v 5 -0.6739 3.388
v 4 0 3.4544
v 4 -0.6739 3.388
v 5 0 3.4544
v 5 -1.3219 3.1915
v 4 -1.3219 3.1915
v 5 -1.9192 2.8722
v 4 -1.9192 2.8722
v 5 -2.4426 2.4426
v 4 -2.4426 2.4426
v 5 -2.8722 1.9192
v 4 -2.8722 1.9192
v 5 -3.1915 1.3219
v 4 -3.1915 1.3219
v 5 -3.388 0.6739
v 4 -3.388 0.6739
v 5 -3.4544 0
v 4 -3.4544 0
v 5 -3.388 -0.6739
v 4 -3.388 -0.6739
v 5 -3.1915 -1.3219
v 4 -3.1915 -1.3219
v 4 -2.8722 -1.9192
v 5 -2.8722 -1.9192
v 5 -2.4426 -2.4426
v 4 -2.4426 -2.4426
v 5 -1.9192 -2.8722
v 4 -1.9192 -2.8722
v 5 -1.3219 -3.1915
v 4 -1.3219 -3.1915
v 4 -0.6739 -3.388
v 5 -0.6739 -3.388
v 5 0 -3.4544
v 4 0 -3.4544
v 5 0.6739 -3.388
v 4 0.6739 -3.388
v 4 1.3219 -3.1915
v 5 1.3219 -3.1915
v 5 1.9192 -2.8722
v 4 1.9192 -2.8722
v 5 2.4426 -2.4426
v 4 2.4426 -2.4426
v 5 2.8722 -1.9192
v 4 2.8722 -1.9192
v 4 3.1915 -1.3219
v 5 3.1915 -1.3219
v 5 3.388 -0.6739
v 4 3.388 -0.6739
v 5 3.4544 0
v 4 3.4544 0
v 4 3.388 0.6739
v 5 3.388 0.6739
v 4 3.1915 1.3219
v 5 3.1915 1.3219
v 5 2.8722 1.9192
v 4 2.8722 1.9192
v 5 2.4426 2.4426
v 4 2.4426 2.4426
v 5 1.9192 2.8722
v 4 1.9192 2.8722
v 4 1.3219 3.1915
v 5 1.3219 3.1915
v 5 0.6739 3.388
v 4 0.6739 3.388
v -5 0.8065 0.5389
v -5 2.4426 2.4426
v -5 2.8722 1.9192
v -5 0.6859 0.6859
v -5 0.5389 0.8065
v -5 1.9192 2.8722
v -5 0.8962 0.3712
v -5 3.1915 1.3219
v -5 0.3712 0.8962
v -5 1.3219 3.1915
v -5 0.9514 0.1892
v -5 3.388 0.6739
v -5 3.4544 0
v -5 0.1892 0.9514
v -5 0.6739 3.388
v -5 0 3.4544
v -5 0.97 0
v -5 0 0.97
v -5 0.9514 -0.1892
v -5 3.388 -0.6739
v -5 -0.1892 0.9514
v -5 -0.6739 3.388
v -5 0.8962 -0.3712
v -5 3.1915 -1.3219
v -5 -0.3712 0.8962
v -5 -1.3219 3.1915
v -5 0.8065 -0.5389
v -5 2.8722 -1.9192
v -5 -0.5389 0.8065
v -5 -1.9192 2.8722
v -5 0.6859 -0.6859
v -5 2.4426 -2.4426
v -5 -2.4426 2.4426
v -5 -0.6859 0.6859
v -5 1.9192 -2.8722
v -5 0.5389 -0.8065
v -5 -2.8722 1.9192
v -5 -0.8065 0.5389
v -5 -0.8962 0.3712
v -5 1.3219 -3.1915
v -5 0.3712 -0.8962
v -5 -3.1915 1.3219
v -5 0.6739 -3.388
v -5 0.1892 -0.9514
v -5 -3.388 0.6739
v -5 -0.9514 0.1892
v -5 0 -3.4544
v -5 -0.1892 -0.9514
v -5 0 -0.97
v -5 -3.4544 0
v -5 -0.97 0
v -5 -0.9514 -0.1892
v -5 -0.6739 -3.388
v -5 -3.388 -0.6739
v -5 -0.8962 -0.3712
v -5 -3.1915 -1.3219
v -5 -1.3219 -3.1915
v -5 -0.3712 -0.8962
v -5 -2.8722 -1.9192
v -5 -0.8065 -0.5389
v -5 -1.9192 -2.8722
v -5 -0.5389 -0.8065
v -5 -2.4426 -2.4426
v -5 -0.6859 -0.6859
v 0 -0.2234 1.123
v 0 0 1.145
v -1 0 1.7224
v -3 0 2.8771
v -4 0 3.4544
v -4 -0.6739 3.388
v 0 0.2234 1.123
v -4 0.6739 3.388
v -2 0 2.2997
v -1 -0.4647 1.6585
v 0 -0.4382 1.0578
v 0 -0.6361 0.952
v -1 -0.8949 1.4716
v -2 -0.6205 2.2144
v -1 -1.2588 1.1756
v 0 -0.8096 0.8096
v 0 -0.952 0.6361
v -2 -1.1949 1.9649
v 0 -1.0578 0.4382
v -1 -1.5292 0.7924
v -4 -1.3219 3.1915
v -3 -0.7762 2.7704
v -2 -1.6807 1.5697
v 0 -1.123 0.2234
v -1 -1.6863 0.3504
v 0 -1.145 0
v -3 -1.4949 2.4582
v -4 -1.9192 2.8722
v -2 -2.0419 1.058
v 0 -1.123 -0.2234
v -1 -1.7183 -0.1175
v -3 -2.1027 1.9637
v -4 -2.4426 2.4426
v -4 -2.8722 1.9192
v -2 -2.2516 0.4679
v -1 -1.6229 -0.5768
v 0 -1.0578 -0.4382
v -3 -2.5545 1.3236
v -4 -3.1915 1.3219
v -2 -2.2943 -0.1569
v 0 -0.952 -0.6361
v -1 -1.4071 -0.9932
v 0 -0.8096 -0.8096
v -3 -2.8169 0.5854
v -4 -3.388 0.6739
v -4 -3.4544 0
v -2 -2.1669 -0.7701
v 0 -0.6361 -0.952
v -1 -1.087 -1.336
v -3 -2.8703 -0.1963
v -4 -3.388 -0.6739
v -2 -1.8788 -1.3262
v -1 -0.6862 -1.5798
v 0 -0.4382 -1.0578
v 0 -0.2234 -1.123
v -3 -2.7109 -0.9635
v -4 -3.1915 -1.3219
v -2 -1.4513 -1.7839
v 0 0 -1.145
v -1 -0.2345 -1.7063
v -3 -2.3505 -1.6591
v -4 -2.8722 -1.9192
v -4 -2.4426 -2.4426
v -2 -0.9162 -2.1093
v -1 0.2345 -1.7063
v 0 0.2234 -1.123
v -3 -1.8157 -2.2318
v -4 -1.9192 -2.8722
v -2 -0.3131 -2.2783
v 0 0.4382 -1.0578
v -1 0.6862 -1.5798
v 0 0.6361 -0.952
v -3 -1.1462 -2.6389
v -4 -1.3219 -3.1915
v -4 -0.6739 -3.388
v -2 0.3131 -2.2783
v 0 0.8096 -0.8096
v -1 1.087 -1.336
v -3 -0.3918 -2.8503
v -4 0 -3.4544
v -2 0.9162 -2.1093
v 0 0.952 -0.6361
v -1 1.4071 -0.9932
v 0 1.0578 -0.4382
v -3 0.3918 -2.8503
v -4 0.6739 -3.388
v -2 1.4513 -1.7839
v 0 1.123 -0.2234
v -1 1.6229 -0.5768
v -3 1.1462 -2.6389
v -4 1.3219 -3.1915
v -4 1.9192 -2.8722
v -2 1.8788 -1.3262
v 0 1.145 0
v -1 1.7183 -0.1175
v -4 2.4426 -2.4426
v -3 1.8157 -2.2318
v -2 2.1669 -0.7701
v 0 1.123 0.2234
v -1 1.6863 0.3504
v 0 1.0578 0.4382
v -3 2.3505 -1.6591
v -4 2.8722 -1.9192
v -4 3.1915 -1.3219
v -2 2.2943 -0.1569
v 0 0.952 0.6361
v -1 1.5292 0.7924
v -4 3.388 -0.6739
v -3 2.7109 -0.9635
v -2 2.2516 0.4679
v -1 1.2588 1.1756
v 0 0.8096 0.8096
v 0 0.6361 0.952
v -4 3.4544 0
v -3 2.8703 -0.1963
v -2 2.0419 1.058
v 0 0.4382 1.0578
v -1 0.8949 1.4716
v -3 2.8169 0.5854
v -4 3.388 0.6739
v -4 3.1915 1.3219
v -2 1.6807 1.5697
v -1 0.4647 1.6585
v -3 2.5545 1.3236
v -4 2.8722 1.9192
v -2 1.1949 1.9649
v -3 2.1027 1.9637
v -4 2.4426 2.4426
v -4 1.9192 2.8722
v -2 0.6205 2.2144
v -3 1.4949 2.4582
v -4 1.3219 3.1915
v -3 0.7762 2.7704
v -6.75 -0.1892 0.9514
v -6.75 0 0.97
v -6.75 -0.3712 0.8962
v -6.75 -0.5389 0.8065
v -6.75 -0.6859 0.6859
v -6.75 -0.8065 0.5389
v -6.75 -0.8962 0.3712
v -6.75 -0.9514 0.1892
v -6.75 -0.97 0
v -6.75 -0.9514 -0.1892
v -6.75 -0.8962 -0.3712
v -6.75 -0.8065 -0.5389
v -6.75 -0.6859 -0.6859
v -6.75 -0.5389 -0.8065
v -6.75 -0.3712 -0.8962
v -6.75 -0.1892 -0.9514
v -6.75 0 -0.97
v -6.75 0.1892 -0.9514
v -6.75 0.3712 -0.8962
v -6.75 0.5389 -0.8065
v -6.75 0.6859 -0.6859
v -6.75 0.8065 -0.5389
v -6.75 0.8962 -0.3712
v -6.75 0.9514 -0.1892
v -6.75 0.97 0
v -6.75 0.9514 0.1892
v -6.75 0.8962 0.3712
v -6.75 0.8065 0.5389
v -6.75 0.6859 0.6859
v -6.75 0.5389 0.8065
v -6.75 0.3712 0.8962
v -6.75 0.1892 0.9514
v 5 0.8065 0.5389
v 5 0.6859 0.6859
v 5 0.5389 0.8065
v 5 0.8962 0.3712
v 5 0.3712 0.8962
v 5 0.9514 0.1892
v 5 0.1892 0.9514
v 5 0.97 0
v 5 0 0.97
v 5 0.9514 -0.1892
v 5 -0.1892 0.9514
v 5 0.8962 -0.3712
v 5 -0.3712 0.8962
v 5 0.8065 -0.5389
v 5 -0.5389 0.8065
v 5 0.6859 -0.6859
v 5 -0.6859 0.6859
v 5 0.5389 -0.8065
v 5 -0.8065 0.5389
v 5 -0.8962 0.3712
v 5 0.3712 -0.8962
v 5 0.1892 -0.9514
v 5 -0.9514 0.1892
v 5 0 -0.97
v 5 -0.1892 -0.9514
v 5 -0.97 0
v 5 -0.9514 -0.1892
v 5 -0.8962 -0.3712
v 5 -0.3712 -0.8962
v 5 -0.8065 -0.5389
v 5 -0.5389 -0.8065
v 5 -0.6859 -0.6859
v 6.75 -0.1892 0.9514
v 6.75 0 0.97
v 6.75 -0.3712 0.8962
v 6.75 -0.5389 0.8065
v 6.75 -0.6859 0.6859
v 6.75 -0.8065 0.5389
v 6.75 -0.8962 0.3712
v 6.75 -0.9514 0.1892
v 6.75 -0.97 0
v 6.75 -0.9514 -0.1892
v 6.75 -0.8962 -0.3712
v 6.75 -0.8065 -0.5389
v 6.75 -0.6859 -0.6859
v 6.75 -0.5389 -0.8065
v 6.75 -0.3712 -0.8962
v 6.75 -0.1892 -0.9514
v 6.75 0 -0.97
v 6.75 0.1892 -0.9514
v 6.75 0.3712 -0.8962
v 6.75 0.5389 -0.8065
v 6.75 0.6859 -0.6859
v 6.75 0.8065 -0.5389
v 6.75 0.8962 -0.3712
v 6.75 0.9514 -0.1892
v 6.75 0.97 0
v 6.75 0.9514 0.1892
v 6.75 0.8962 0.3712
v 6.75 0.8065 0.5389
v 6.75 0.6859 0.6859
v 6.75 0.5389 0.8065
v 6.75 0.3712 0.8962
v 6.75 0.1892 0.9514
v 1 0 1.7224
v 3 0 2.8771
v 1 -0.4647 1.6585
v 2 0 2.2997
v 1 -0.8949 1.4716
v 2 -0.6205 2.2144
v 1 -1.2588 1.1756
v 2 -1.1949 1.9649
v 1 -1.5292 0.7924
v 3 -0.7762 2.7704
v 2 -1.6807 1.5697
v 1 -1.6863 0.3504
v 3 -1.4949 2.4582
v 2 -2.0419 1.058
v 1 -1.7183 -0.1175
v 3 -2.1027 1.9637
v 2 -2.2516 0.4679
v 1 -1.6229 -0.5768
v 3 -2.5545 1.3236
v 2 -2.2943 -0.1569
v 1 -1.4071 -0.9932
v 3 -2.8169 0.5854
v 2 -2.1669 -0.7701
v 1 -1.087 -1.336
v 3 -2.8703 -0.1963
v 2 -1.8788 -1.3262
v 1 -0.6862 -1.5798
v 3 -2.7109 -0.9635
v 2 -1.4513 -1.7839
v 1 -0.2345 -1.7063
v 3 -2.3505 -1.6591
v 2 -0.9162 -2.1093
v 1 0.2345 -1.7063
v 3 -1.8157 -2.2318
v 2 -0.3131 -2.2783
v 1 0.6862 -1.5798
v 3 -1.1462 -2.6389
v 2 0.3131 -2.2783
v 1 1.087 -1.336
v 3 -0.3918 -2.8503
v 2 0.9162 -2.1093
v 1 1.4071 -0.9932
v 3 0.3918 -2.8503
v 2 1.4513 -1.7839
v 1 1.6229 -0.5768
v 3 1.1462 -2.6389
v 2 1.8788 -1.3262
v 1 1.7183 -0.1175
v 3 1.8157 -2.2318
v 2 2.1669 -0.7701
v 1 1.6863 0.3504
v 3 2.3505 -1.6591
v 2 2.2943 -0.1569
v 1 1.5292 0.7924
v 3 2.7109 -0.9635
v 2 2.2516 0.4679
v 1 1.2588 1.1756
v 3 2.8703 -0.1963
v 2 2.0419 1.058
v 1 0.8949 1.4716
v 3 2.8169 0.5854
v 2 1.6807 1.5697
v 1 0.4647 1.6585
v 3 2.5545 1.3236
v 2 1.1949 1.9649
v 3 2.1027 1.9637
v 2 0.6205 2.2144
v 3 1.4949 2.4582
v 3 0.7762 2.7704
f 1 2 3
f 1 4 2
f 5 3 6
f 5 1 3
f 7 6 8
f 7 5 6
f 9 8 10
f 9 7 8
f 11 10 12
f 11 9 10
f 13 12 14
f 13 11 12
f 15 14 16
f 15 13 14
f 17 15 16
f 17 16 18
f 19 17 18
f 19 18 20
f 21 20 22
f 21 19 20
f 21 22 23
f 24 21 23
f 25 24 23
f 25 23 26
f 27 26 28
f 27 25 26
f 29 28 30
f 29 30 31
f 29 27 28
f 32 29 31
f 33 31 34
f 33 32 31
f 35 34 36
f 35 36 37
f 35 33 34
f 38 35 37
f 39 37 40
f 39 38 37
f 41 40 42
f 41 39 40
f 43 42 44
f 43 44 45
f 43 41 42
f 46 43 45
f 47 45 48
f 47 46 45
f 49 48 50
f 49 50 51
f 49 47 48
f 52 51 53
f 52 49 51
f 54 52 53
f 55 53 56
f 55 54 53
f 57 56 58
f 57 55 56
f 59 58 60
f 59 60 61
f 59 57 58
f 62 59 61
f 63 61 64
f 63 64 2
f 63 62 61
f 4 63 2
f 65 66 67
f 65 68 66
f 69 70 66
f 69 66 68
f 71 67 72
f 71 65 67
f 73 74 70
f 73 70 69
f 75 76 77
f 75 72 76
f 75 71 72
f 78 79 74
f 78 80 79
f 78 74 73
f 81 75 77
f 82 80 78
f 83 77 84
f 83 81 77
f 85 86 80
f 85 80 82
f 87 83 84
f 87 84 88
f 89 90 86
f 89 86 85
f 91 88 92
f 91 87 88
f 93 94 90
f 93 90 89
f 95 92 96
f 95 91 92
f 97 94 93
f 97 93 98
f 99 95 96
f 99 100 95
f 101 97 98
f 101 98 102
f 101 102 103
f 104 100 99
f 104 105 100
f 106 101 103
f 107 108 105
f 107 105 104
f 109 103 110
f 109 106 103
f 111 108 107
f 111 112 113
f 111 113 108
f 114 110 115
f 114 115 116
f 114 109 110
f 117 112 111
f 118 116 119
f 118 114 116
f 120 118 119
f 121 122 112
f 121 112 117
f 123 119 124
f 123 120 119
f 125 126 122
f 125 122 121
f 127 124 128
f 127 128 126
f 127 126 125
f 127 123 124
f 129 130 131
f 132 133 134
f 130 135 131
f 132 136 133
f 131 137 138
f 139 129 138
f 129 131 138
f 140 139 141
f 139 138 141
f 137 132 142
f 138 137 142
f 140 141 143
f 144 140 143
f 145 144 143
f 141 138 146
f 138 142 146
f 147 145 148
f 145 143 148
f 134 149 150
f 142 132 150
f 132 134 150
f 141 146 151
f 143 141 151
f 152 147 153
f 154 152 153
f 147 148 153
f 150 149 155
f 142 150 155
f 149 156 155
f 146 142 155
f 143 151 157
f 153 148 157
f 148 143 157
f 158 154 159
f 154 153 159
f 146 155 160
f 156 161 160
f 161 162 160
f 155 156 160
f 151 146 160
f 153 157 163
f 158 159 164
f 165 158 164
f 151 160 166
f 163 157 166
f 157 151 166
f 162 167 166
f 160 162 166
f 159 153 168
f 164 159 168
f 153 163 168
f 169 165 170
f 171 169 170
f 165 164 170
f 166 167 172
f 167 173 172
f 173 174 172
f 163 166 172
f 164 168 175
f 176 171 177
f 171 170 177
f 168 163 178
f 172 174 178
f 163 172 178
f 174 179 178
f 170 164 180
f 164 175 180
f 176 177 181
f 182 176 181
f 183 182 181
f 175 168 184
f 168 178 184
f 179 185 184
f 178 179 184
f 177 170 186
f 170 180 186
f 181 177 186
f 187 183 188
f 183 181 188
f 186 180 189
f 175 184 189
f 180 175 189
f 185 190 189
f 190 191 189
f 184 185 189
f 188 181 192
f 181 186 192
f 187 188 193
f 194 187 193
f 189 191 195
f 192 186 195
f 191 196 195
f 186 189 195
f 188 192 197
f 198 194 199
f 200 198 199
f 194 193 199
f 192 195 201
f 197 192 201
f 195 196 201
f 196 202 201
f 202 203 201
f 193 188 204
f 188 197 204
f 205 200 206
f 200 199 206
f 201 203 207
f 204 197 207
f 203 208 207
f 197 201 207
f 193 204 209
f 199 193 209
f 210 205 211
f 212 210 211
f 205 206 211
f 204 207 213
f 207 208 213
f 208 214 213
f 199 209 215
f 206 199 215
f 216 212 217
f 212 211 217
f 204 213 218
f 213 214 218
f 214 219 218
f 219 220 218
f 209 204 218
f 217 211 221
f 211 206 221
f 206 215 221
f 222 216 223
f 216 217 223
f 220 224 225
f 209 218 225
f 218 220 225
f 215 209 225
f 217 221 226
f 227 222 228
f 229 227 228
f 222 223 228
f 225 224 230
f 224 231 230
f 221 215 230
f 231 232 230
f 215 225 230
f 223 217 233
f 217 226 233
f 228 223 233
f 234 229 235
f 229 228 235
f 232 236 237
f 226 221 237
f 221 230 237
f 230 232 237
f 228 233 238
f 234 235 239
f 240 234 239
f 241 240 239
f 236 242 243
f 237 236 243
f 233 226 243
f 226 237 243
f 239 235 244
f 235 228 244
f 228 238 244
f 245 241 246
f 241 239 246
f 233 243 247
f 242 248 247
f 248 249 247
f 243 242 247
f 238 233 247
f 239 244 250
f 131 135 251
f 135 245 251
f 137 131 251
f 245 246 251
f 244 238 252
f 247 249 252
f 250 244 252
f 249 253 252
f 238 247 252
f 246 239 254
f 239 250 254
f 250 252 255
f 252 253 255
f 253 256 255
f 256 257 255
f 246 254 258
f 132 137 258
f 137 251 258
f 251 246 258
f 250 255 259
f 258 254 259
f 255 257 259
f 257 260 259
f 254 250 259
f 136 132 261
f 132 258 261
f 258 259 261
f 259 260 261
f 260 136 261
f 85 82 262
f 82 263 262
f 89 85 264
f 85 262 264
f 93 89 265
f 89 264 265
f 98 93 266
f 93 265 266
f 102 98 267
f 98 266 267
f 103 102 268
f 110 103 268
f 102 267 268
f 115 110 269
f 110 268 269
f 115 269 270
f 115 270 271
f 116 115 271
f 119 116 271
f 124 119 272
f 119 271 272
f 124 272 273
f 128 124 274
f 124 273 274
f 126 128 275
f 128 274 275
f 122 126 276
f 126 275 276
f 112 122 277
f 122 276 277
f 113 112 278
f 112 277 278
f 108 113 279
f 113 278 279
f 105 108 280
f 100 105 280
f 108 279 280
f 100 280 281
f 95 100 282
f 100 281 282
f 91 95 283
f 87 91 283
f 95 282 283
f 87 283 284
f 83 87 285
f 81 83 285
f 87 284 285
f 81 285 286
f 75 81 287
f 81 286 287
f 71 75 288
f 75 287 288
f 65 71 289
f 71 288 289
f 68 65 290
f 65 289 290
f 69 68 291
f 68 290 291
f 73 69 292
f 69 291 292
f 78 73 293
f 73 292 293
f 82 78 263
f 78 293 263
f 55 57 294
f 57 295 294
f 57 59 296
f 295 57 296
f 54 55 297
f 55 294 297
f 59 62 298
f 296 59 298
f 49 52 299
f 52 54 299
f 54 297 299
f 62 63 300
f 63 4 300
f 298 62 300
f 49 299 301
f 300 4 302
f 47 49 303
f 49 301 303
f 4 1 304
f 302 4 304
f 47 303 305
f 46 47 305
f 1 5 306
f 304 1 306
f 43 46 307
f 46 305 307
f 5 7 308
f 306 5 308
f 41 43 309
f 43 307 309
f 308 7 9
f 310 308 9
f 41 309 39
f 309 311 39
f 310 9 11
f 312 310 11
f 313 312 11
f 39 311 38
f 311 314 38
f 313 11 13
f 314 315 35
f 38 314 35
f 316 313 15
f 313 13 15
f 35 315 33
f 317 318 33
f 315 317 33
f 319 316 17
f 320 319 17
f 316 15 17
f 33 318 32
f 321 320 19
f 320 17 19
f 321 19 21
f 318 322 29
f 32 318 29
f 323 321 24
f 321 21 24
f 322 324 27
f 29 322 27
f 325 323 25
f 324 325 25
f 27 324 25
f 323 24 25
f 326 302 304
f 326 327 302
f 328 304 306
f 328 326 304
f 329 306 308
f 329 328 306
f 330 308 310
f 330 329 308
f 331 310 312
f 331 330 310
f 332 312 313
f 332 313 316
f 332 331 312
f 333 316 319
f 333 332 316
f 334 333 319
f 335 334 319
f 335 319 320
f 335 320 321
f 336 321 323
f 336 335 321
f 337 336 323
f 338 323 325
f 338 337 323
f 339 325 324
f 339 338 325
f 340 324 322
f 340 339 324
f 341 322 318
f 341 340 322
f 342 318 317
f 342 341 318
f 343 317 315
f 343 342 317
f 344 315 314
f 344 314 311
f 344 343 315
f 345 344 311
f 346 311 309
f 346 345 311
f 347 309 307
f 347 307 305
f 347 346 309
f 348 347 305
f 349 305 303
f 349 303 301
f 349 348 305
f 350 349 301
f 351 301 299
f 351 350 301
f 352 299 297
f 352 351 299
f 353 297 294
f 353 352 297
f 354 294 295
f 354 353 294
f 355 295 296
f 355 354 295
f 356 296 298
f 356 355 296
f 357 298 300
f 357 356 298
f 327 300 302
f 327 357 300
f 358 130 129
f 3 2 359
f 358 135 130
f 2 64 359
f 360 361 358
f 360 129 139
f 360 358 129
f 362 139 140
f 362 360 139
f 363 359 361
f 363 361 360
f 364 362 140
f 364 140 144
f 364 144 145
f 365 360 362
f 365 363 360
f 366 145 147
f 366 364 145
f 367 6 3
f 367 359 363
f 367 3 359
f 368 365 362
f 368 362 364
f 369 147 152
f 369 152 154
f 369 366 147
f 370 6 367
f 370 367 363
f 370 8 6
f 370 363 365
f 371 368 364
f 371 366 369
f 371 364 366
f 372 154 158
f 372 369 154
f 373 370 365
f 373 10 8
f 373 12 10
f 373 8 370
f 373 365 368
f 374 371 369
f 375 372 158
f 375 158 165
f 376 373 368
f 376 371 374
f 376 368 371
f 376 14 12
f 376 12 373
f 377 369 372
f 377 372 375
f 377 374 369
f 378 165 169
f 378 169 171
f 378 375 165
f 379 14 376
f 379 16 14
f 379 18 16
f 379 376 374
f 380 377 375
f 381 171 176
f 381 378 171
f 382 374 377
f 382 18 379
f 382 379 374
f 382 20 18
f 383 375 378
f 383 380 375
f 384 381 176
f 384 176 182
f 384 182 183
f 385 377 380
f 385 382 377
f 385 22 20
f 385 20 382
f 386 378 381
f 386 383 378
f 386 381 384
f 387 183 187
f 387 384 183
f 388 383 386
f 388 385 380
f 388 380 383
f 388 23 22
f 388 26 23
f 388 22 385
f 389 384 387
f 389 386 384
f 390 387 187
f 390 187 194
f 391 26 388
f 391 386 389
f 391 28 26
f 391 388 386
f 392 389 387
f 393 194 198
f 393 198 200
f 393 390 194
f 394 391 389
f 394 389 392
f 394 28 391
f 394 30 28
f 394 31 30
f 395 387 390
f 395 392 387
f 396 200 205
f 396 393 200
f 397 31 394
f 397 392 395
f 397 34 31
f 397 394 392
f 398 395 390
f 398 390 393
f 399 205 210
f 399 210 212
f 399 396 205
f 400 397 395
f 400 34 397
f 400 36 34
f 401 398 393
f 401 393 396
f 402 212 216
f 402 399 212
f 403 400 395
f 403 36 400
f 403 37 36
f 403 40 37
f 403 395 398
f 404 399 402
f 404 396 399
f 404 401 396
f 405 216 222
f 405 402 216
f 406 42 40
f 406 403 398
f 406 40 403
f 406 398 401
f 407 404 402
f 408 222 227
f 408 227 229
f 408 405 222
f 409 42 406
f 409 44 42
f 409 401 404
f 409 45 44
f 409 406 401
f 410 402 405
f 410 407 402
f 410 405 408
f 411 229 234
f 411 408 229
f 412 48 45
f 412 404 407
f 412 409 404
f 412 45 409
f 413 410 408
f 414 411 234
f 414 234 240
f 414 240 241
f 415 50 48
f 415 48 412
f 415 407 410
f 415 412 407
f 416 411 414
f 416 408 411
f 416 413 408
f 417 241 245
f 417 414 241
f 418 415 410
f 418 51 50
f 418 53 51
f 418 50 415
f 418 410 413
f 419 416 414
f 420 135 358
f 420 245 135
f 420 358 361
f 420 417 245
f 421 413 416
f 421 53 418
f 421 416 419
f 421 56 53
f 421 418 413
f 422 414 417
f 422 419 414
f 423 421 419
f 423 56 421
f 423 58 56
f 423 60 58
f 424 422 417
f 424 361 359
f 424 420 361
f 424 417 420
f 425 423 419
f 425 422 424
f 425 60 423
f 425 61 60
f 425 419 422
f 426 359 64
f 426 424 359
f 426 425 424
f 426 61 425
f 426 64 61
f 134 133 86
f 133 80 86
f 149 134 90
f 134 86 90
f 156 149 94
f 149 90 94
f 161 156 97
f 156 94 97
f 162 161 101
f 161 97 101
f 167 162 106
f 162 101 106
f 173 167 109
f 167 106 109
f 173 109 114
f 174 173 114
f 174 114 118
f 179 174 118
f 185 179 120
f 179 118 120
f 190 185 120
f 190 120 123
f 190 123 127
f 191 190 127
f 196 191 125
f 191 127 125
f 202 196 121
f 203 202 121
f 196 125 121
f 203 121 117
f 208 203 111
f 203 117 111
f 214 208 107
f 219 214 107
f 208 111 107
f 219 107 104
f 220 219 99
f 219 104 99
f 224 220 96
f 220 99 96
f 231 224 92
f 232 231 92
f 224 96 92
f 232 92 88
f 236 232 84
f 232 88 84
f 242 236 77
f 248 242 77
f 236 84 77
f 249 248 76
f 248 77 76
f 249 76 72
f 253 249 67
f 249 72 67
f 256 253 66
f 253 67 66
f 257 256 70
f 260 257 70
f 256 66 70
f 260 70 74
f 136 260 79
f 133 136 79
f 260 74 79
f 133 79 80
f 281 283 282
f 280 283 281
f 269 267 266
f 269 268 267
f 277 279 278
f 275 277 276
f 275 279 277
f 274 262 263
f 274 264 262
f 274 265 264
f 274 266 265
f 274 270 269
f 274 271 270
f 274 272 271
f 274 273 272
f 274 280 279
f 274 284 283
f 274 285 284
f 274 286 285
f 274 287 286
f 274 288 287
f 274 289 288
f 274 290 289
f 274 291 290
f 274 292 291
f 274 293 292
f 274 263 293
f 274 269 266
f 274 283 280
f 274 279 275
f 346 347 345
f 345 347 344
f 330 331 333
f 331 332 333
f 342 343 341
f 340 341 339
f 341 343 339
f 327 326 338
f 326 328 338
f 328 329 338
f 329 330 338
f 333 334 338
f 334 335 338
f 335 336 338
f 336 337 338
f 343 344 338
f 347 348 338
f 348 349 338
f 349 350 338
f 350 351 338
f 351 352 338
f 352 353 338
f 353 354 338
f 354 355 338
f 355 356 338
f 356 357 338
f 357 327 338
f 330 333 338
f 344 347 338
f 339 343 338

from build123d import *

# Parameters (mm, degrees)
SKETCH1_W   = 1
SKETCH1_H   = 3.454401077
SKETCH1_W_2 = 1.75
SKETCH1_H_2 = 0.97


with BuildPart() as part:
    # Sketch1 → Revolve1 (revolve)
    with BuildSketch(Plane.XY, mode=Mode.PRIVATE) as revolve1_sk:
        Polygon((0, 0), (0, 1.145), (4, 3.454401077), (4, 0), align=None)
        with Locations((4.5, 1.727200539)):
            Rectangle(SKETCH1_W, SKETCH1_H)
        with Locations((5.875, 0.485)):
            Rectangle(SKETCH1_W_2, SKETCH1_H_2)
    revolve1 = revolve(revolve1_sk.sketch.rotate(Axis((0, 0, 0), (1, 0, 0)), 90), axis=Axis((0, 0, 0), (1, 0, 0)))

    # Mirror1: Revolve1 across plane
    add(revolve1.mirror(Plane(origin=(0, 0, 0), x_dir=(0, 0, 1), z_dir=(1, 0, 0))))


solid = part.part
